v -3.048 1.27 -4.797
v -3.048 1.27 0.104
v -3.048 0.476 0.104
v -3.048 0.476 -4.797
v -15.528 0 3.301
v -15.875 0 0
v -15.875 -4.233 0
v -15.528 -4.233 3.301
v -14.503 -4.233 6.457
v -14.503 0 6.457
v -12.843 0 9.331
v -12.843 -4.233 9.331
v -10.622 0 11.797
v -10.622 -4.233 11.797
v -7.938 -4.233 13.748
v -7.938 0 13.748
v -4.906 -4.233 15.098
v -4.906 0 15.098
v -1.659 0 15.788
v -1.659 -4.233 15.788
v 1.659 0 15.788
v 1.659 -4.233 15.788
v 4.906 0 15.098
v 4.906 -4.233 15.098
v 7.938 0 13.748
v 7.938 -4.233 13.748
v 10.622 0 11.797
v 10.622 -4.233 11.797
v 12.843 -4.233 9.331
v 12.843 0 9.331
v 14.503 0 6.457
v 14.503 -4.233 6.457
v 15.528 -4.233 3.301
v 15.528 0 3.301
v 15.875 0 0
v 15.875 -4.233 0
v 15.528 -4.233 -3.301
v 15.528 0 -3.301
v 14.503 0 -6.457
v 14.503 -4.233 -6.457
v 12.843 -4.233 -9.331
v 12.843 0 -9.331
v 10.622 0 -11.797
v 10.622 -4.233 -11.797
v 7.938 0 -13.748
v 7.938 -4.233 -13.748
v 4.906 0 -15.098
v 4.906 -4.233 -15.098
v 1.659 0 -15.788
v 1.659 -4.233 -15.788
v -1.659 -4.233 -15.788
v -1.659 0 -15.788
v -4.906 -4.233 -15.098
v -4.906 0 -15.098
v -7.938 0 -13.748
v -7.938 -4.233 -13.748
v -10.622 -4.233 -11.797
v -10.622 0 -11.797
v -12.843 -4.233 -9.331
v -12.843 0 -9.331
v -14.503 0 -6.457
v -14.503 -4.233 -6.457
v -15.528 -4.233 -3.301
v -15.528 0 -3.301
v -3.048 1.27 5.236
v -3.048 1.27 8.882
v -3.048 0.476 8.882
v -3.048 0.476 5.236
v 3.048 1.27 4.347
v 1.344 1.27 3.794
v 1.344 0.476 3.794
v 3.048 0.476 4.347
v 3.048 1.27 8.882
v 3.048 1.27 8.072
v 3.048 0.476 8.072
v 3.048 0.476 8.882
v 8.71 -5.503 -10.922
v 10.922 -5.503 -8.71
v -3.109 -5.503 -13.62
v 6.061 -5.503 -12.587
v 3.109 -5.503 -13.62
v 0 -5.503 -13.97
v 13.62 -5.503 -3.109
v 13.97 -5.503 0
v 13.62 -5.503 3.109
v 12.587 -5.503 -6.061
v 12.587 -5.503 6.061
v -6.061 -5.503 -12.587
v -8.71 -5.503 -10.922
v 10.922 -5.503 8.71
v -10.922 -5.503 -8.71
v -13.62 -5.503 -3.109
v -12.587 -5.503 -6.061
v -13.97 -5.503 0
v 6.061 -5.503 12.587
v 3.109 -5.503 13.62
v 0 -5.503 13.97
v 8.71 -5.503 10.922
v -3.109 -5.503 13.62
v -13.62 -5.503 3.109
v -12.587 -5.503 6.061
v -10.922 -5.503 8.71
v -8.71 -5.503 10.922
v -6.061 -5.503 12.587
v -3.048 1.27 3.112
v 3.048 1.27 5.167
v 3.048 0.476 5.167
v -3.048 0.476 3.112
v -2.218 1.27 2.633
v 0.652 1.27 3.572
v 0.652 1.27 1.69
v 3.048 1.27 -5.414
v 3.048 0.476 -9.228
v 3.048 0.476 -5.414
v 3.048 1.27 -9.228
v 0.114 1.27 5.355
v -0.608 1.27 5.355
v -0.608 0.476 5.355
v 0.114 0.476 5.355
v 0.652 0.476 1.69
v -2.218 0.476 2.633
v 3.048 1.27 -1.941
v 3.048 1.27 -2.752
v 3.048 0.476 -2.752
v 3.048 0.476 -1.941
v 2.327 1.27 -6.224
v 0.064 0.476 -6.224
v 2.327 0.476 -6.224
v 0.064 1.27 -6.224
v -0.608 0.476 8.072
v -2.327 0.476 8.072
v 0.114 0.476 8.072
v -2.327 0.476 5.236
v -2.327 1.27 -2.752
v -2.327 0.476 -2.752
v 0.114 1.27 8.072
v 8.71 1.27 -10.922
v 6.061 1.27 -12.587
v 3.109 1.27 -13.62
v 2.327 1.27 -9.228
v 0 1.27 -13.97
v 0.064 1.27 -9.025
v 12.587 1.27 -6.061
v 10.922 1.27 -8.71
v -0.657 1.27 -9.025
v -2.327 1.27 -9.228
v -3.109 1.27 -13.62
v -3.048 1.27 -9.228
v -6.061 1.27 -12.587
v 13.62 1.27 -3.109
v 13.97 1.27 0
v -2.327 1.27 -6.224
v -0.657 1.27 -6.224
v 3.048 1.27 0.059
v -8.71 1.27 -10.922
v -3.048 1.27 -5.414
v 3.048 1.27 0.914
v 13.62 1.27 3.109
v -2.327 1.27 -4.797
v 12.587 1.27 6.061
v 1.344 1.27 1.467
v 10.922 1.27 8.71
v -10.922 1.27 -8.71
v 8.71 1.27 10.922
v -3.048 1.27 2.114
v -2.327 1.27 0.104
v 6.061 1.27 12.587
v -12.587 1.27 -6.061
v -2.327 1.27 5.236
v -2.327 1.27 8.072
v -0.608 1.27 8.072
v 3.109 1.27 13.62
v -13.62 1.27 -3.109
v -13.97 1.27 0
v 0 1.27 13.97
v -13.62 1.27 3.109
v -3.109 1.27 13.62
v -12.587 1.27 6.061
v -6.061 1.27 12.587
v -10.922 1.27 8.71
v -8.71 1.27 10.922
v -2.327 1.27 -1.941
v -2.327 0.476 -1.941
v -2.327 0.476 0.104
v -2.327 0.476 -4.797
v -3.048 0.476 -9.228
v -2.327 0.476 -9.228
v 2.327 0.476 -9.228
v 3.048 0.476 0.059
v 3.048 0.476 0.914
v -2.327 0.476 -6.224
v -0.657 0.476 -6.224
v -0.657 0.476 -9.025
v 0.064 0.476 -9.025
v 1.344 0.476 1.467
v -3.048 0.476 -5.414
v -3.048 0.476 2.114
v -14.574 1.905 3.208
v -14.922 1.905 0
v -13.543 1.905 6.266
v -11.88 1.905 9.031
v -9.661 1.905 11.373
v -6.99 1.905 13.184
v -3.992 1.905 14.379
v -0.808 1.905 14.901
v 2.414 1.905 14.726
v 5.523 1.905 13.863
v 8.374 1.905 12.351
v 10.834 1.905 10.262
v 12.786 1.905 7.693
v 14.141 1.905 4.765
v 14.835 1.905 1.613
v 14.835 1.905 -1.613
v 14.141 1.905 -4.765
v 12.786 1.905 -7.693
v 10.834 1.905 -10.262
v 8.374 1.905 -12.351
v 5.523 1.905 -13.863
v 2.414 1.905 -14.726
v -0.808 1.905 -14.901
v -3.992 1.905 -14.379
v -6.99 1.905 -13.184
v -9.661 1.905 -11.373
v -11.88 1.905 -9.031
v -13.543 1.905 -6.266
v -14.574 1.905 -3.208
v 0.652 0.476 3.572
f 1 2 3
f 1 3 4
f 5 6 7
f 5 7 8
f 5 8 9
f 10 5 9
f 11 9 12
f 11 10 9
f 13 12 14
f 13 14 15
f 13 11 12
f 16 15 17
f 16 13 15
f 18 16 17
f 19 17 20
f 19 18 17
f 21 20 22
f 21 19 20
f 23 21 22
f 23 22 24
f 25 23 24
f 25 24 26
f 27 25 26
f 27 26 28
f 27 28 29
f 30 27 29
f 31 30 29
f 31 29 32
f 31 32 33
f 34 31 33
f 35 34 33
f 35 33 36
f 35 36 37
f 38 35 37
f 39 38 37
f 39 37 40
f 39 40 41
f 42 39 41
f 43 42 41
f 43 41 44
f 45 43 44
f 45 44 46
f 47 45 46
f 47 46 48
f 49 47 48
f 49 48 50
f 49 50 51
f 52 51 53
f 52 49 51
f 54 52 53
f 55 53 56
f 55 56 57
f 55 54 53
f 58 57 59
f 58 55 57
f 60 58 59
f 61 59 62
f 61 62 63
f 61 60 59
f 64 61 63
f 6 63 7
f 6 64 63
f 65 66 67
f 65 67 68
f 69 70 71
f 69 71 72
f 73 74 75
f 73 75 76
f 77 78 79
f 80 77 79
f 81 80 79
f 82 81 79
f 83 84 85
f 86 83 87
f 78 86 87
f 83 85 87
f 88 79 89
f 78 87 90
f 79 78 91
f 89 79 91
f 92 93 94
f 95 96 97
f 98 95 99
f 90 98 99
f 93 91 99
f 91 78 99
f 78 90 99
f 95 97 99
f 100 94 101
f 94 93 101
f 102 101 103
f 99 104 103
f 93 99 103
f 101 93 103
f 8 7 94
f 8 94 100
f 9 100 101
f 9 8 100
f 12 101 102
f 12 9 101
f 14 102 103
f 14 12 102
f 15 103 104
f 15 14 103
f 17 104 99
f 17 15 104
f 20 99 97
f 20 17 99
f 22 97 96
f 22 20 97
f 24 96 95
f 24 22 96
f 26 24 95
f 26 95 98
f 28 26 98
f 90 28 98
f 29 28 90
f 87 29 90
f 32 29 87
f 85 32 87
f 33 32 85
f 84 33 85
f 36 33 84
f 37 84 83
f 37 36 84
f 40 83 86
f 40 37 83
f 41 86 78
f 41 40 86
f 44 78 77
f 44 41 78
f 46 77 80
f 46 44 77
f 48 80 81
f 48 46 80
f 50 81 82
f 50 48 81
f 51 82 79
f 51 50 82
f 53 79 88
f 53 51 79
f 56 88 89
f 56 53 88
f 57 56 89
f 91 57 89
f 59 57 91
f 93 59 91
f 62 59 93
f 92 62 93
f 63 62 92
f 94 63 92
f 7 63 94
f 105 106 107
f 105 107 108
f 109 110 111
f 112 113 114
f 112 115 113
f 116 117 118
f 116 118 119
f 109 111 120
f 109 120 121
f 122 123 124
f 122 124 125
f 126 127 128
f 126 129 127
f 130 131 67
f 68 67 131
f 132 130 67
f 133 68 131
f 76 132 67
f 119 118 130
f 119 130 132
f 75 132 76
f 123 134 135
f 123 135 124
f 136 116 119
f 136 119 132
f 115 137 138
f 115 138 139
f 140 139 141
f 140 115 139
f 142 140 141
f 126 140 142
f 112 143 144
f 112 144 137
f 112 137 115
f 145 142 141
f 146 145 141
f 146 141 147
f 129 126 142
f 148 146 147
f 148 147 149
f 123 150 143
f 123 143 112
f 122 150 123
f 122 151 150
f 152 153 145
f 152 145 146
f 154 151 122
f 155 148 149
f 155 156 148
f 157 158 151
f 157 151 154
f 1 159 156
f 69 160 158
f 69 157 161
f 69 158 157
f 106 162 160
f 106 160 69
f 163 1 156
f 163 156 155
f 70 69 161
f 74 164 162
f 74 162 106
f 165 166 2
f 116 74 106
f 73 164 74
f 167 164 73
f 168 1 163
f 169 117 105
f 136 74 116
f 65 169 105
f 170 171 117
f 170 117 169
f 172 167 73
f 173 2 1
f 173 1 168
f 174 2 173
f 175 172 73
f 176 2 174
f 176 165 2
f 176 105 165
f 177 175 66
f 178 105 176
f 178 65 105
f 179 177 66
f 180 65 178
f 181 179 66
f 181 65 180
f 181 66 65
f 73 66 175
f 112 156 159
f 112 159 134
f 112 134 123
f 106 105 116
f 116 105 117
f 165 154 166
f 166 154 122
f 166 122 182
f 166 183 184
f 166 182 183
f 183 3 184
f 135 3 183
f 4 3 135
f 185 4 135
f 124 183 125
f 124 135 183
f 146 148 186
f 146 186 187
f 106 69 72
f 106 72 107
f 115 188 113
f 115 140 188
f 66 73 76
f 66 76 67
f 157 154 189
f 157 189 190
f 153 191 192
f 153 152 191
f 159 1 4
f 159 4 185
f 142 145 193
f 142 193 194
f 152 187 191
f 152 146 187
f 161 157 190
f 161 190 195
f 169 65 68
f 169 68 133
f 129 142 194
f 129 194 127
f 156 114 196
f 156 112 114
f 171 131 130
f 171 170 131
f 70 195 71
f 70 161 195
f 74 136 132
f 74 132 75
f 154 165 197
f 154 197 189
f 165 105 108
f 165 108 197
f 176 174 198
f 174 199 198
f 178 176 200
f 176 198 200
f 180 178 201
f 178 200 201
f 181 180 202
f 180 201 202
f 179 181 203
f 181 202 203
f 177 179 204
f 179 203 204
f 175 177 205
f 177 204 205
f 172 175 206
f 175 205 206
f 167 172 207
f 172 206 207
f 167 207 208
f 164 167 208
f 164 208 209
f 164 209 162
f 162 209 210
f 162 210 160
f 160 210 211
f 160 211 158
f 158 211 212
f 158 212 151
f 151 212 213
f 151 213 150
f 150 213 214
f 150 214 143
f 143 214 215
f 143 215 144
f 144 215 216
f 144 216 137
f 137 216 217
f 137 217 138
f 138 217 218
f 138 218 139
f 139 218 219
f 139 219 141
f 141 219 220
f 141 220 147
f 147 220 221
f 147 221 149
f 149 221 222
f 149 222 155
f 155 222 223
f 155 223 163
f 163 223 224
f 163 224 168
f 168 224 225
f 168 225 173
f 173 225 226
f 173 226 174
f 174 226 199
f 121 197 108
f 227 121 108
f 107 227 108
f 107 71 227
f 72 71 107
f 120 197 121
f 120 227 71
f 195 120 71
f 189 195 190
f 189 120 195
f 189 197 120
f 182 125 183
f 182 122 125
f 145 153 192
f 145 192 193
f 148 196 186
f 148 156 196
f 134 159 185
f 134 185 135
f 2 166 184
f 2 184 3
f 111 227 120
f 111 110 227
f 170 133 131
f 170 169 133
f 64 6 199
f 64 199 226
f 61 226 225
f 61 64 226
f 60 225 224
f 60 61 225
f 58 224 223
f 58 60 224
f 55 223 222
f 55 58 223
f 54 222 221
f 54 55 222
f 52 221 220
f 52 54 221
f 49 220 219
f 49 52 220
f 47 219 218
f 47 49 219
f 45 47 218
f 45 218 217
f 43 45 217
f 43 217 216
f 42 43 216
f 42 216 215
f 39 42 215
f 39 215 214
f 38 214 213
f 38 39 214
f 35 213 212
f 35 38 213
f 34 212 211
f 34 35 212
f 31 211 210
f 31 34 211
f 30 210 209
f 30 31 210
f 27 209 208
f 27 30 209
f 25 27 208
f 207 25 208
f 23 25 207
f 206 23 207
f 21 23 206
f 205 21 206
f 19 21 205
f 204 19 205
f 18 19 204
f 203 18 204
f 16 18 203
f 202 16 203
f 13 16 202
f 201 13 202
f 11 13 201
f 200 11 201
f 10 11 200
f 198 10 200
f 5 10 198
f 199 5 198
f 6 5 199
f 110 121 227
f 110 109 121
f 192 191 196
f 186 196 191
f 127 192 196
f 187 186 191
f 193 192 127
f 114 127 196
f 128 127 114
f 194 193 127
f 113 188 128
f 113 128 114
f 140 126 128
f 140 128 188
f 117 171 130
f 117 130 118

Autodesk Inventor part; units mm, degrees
ref_plane "YZ Plane" through (0, 0, 0) normal (1, 0, 0) x (0, 1, 0)
ref_plane "XZ Plane" through (0, 0, 0) normal (0, 1, 0) x (-1, 0, 0)
ref_plane "XY Plane" through (0, 0, 0) normal (0, 0, 1) x (1, 0, 0)
sketch "Sketch1" plane through (0, 0, 0) normal (0, 0, 1) x (1, 0, 0)
  line L0 (-15.875, 0) -> (0, 0)
  line L1 (0, 0) -> (0, -4.2333)
  line L2 (0, -4.2333) -> (-15.875, -4.2333)
  line L3 (-15.875, -4.2333) -> (-15.875, 0)
  line L4 (0, -4.2333) -> (-13.97, -4.2333)
  line L5 (-13.97, -4.2333) -> (-13.97, -5.5033)
  line L6 (-13.97, -5.5033) -> (0, -5.5033)
  line L7 (0, -5.5033) -> (0, -4.2333)
  line L8 (-15.875, -4.2333) -> (-13.6299, -4.2333) construction
  line L9 (-15.875, 0) -> (-12.7, 0) construction
  line L10 (-13.97, 1.27) -> (0, 1.27)
  line L11 (0, 1.27) -> (0, 0)
  line L12 (0, 0) -> (-13.97, 0)
  line L13 (-13.97, 0) -> (-13.97, 1.27)
  line L14 (-15.875, 0) -> (-12.8362, 0) construction
  line L15 (-15.875, -4.2333) -> (-13.97, -5.5033)
  line L16 (-15.875, 0) -> (-14.9225, 1.905)
  line L17 (-14.9225, 1.905) -> (-13.97, 1.27)
  line L18 (-13.97, 0) -> (-15.875, 0)
  line L19 (0, -6.985) -> (0, 3.3867) projected
  point P0 (0, 0)
  point P1 (-13.97, 0.635)
  point P2 (0, 0.635)
  point P3 (-6.985, -4.2333)
  point P4 (-14.9225, 0)
  dimension "d0" = 0
  dimension "d1" = 4.2333
  dimension "d2" = 15.875
  dimension "d3" = 0
  dimension "d5" = 13.97
  dimension "d9" = 13.97
  dimension "d10" = 1.27
  dimension "d11" = 1.27
  dimension "d12" = 0.635
  dimension "d13" = 0
revolve "Revolution1" add sketch "Sketch1" angle 360 about axis through (0, -10, 0) along (0, 1, 0)
sketch "Sketch2" plane through (0, 1.27, 0) normal (0, 1, 0) x (1, 0, 0)
  line L0 (-2.3268, -5.2364) -> (-2.3268, -8.072)
  line L1 (-2.3268, -8.072) -> (-0.6076, -8.072)
  line L2 (-0.6076, -8.072) -> (-0.6076, -5.355)
  line L3 (-0.6076, -5.355) -> (0.1136, -5.355)
  line L4 (0.1136, -5.355) -> (0.1136, -8.072)
  line L5 (0.1136, -8.072) -> (3.048, -8.072)
  line L6 (3.048, -8.072) -> (3.048, -8.8822)
  line L7 (3.048, -8.8822) -> (-3.048, -8.8822)
  line L8 (-3.048, -8.8822) -> (-3.048, -5.2364)
  line L9 (-3.048, -5.2364) -> (-2.3268, -5.2364)
  line L10 (3.048, -5.1673) -> (-3.048, -3.1122)
  line L11 (-3.048, -3.1122) -> (-3.048, -2.1143)
  line L12 (-3.048, -2.1143) -> (3.048, -0.0593)
  line L13 (3.048, -0.0593) -> (3.048, -0.9139)
  line L14 (3.048, -0.9139) -> (1.3437, -1.4672)
  line L15 (1.3437, -1.4672) -> (1.3437, -3.7939)
  line L16 (1.3437, -3.7939) -> (3.048, -4.3472)
  line L17 (3.048, -4.3472) -> (3.048, -5.1673)
  line L18 (0.6521, -1.6895) -> (-2.2181, -2.633)
  line L19 (-2.2181, -2.633) -> (0.6521, -3.5716)
  line L20 (0.6521, -3.5716) -> (0.6521, -1.6895)
  line L21 (3.048, 1.9414) -> (-2.3268, 1.9414)
  line L22 (-2.3268, 1.9414) -> (-2.3268, -0.1037)
  line L23 (-2.3268, -0.1037) -> (-3.048, -0.1037)
  line L24 (-3.048, -0.1037) -> (-3.048, 4.7968)
  line L25 (-3.048, 4.7968) -> (-2.3268, 4.7968)
  line L26 (-2.3268, 4.7968) -> (-2.3268, 2.7516)
  line L27 (-2.3268, 2.7516) -> (3.048, 2.7516)
  line L28 (3.048, 2.7516) -> (3.048, 1.9414)
  line L29 (3.048, 5.4143) -> (-3.048, 5.4143)
  line L30 (-3.048, 5.4143) -> (-3.048, 9.228)
  line L31 (-3.048, 9.228) -> (-2.3268, 9.228)
  line L32 (-2.3268, 9.228) -> (-2.3268, 6.2244)
  line L33 (-2.3268, 6.2244) -> (-0.657, 6.2244)
  line L34 (-0.657, 6.2244) -> (-0.657, 9.0254)
  line L35 (-0.657, 9.0254) -> (0.0642, 9.0254)
  line L36 (0.0642, 9.0254) -> (0.0642, 6.2244)
  line L37 (0.0642, 6.2244) -> (2.3268, 6.2244)
  line L38 (2.3268, 6.2244) -> (2.3268, 9.228)
  line L39 (2.3268, 9.228) -> (3.048, 9.228)
  line L40 (3.048, 9.228) -> (3.048, 5.4143)
  point P0 (0, 0)
  point P1 (0, 0)
extrude "Extrusion1" cut sketch "Sketch2" against normal blind 0.7937
equation "\"d17\" = 0.5 * d16"
equation "\"d16\" = 12.7"
properties part number "Fate Game Piece V1.01"
